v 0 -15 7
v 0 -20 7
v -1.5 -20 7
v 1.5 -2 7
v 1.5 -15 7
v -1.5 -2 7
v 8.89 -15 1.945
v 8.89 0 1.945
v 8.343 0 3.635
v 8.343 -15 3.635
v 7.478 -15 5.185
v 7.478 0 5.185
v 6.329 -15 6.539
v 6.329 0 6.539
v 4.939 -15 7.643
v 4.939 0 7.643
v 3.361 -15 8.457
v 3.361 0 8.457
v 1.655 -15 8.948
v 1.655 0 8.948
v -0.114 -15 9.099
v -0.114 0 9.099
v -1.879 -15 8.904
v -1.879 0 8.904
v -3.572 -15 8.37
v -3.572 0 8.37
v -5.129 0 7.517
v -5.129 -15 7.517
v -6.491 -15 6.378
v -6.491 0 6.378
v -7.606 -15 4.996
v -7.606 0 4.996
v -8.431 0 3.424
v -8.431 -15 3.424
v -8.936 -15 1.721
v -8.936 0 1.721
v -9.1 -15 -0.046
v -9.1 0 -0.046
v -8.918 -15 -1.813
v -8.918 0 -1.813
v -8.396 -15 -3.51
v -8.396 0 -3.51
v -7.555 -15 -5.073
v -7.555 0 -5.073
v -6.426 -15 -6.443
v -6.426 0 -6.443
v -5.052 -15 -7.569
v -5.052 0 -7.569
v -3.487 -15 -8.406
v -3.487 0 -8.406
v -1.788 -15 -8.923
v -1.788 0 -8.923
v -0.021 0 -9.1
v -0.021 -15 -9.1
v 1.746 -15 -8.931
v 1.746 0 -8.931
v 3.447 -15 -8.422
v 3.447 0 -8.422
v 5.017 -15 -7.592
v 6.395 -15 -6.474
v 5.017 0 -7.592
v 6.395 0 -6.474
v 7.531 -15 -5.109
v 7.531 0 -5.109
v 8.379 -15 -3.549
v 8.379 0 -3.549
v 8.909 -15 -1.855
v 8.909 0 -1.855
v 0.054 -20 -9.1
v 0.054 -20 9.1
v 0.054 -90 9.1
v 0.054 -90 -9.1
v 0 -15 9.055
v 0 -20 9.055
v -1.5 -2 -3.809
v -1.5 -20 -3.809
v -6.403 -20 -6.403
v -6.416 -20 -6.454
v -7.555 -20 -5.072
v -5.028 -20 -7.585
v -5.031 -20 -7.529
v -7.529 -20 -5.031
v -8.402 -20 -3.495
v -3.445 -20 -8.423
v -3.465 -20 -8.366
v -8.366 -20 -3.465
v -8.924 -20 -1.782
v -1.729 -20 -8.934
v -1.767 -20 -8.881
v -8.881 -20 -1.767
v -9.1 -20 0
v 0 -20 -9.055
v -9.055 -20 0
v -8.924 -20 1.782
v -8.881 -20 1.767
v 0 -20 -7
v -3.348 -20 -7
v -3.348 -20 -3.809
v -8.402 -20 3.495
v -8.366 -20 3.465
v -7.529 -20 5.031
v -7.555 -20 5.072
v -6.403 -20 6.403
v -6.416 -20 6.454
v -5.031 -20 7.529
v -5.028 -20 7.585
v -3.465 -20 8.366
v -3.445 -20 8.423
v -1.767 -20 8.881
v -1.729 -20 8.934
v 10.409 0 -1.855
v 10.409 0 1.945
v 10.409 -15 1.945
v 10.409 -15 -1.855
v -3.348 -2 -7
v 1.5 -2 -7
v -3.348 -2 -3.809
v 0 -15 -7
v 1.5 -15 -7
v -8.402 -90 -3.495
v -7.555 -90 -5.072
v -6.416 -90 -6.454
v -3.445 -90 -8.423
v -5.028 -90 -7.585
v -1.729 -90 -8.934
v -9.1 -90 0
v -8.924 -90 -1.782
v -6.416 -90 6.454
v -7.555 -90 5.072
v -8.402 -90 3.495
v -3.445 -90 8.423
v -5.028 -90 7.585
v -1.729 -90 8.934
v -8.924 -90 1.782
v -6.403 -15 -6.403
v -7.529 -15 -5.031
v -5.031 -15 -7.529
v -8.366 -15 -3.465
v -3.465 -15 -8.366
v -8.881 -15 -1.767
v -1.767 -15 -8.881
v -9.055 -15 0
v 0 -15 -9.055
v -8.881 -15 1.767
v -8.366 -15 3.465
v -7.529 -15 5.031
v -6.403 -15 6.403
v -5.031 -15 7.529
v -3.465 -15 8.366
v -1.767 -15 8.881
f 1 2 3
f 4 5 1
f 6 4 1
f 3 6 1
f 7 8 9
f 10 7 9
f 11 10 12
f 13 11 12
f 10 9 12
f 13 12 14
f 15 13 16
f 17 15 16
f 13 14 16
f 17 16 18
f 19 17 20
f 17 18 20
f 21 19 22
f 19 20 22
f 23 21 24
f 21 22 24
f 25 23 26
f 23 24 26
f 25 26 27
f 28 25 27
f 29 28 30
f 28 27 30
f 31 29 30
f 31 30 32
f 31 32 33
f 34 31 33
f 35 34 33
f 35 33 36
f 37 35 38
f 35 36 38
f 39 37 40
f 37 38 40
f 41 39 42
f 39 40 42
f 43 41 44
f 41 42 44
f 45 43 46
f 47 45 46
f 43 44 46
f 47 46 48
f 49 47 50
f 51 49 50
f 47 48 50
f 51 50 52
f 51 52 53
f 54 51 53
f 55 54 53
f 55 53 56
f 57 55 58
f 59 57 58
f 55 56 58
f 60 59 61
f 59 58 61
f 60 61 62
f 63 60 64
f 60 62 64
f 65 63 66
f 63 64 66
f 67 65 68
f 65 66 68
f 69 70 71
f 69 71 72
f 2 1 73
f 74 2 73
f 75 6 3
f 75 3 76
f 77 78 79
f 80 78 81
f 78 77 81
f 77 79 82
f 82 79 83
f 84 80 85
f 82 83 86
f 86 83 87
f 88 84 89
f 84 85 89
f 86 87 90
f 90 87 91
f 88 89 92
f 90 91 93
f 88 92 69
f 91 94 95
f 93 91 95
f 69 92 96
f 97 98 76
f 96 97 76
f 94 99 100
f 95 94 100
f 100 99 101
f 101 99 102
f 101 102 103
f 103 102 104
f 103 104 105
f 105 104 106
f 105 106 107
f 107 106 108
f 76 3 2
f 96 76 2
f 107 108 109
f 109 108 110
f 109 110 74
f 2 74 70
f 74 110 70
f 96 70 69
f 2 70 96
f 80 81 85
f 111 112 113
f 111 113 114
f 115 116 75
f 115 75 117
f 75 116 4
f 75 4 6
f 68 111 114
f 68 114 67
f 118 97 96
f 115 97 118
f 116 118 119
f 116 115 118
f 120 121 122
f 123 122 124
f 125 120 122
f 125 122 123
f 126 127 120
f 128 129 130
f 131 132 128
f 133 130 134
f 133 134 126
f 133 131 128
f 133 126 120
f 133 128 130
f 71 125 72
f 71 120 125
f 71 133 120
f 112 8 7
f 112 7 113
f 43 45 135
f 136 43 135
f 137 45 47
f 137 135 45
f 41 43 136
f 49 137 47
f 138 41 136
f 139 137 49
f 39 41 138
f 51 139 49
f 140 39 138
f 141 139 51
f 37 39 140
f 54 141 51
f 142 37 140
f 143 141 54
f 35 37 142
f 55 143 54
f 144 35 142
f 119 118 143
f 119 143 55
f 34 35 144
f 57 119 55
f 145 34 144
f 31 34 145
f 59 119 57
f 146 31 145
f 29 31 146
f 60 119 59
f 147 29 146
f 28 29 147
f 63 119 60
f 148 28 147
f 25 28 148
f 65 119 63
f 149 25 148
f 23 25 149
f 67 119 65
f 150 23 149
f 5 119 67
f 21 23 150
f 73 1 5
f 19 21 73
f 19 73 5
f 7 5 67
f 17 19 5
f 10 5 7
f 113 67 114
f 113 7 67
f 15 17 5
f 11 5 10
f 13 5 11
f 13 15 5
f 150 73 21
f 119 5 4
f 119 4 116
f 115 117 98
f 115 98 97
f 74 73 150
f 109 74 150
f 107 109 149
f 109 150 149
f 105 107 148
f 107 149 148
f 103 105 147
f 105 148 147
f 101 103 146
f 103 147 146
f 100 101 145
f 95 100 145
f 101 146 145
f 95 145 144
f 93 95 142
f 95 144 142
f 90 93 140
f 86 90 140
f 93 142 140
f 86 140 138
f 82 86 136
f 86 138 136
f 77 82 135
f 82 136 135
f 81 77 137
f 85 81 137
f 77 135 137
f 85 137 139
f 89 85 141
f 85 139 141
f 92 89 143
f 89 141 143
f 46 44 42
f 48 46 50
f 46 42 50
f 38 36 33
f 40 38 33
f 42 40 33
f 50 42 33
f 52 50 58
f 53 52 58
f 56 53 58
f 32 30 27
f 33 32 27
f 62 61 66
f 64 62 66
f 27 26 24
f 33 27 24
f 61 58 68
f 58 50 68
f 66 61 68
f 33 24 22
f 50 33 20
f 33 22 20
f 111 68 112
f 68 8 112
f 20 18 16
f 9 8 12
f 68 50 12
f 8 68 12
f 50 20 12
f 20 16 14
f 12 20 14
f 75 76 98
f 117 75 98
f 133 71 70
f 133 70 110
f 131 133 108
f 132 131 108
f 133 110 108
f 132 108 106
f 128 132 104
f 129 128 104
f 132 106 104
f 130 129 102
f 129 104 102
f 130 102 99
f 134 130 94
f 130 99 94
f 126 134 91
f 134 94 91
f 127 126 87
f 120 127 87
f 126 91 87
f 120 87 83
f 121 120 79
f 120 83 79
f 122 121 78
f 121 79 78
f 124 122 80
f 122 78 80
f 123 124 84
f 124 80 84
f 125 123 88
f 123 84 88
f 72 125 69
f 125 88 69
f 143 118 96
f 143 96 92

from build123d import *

# Parameters (mm, degrees)
PAD_DEPTH    = 15
POCKET_DEPTH = 13
PAD001_DEPTH = 5
PAD002_DEPTH = 70


with BuildPart() as part:
    # Sketch → Pad (new body)
    with BuildSketch(Plane.XZ):
        with BuildLine():
            ThreePointArc((8.889624, 1.945402), (-9.099882, -0.046426), (8.90901, -1.854598))
            Line((10.40901, -1.854598), (8.90901, -1.854598))
            Line((10.40901, 1.945402), (10.40901, -1.854598))
            Line((8.889624, 1.945402), (10.40901, 1.945402))
        make_face()
    extrude(amount=PAD_DEPTH)

    # Sketch001 (on Face6 of Pad) → Pocket (cut)
    with BuildSketch(Plane.XZ.offset(15)):
        Polygon((-1.5, 7), (1.5, 7), (1.5, -7), (-3.348355, -7), (-3.348355, -3.808815), (-1.5, -3.808815), align=None)
    extrude(amount=-POCKET_DEPTH, mode=Mode.SUBTRACT)

    # Sketch002 (on Face5 of Pocket) → Pad001 (join)
    with BuildSketch(Plane.XZ.offset(15)):
        with BuildLine():
            Line((0, 7), (-1.5, 7))
            Line((-1.5, 7), (-1.5, -3.808815))
            Line((-1.5, -3.808815), (-3.348355, -3.808815))
            Line((-3.348355, -3.808815), (-3.348355, -7))
            Line((-3.348355, -7), (0, -7))
            Line((0, -7), (0, -9.054887))
            ThreePointArc((0, 9.054887), (-9.054887, 0), (0, -9.054887))
            Line((0, 7), (0, 9.054887))
        make_face()
    extrude(amount=PAD001_DEPTH)

    # Sketch003 (on Face14 of Pad001) → Pad002 (join)
    with BuildSketch(Plane.XZ.offset(20)):
        with BuildLine():
            ThreePointArc((0.053764, 9.099841), (-9.1, 0), (0.053764, -9.099841))
            Line((0.053764, 9.099841), (0.053764, -9.099841))
        make_face()
    extrude(amount=PAD002_DEPTH)


solid = part.part
